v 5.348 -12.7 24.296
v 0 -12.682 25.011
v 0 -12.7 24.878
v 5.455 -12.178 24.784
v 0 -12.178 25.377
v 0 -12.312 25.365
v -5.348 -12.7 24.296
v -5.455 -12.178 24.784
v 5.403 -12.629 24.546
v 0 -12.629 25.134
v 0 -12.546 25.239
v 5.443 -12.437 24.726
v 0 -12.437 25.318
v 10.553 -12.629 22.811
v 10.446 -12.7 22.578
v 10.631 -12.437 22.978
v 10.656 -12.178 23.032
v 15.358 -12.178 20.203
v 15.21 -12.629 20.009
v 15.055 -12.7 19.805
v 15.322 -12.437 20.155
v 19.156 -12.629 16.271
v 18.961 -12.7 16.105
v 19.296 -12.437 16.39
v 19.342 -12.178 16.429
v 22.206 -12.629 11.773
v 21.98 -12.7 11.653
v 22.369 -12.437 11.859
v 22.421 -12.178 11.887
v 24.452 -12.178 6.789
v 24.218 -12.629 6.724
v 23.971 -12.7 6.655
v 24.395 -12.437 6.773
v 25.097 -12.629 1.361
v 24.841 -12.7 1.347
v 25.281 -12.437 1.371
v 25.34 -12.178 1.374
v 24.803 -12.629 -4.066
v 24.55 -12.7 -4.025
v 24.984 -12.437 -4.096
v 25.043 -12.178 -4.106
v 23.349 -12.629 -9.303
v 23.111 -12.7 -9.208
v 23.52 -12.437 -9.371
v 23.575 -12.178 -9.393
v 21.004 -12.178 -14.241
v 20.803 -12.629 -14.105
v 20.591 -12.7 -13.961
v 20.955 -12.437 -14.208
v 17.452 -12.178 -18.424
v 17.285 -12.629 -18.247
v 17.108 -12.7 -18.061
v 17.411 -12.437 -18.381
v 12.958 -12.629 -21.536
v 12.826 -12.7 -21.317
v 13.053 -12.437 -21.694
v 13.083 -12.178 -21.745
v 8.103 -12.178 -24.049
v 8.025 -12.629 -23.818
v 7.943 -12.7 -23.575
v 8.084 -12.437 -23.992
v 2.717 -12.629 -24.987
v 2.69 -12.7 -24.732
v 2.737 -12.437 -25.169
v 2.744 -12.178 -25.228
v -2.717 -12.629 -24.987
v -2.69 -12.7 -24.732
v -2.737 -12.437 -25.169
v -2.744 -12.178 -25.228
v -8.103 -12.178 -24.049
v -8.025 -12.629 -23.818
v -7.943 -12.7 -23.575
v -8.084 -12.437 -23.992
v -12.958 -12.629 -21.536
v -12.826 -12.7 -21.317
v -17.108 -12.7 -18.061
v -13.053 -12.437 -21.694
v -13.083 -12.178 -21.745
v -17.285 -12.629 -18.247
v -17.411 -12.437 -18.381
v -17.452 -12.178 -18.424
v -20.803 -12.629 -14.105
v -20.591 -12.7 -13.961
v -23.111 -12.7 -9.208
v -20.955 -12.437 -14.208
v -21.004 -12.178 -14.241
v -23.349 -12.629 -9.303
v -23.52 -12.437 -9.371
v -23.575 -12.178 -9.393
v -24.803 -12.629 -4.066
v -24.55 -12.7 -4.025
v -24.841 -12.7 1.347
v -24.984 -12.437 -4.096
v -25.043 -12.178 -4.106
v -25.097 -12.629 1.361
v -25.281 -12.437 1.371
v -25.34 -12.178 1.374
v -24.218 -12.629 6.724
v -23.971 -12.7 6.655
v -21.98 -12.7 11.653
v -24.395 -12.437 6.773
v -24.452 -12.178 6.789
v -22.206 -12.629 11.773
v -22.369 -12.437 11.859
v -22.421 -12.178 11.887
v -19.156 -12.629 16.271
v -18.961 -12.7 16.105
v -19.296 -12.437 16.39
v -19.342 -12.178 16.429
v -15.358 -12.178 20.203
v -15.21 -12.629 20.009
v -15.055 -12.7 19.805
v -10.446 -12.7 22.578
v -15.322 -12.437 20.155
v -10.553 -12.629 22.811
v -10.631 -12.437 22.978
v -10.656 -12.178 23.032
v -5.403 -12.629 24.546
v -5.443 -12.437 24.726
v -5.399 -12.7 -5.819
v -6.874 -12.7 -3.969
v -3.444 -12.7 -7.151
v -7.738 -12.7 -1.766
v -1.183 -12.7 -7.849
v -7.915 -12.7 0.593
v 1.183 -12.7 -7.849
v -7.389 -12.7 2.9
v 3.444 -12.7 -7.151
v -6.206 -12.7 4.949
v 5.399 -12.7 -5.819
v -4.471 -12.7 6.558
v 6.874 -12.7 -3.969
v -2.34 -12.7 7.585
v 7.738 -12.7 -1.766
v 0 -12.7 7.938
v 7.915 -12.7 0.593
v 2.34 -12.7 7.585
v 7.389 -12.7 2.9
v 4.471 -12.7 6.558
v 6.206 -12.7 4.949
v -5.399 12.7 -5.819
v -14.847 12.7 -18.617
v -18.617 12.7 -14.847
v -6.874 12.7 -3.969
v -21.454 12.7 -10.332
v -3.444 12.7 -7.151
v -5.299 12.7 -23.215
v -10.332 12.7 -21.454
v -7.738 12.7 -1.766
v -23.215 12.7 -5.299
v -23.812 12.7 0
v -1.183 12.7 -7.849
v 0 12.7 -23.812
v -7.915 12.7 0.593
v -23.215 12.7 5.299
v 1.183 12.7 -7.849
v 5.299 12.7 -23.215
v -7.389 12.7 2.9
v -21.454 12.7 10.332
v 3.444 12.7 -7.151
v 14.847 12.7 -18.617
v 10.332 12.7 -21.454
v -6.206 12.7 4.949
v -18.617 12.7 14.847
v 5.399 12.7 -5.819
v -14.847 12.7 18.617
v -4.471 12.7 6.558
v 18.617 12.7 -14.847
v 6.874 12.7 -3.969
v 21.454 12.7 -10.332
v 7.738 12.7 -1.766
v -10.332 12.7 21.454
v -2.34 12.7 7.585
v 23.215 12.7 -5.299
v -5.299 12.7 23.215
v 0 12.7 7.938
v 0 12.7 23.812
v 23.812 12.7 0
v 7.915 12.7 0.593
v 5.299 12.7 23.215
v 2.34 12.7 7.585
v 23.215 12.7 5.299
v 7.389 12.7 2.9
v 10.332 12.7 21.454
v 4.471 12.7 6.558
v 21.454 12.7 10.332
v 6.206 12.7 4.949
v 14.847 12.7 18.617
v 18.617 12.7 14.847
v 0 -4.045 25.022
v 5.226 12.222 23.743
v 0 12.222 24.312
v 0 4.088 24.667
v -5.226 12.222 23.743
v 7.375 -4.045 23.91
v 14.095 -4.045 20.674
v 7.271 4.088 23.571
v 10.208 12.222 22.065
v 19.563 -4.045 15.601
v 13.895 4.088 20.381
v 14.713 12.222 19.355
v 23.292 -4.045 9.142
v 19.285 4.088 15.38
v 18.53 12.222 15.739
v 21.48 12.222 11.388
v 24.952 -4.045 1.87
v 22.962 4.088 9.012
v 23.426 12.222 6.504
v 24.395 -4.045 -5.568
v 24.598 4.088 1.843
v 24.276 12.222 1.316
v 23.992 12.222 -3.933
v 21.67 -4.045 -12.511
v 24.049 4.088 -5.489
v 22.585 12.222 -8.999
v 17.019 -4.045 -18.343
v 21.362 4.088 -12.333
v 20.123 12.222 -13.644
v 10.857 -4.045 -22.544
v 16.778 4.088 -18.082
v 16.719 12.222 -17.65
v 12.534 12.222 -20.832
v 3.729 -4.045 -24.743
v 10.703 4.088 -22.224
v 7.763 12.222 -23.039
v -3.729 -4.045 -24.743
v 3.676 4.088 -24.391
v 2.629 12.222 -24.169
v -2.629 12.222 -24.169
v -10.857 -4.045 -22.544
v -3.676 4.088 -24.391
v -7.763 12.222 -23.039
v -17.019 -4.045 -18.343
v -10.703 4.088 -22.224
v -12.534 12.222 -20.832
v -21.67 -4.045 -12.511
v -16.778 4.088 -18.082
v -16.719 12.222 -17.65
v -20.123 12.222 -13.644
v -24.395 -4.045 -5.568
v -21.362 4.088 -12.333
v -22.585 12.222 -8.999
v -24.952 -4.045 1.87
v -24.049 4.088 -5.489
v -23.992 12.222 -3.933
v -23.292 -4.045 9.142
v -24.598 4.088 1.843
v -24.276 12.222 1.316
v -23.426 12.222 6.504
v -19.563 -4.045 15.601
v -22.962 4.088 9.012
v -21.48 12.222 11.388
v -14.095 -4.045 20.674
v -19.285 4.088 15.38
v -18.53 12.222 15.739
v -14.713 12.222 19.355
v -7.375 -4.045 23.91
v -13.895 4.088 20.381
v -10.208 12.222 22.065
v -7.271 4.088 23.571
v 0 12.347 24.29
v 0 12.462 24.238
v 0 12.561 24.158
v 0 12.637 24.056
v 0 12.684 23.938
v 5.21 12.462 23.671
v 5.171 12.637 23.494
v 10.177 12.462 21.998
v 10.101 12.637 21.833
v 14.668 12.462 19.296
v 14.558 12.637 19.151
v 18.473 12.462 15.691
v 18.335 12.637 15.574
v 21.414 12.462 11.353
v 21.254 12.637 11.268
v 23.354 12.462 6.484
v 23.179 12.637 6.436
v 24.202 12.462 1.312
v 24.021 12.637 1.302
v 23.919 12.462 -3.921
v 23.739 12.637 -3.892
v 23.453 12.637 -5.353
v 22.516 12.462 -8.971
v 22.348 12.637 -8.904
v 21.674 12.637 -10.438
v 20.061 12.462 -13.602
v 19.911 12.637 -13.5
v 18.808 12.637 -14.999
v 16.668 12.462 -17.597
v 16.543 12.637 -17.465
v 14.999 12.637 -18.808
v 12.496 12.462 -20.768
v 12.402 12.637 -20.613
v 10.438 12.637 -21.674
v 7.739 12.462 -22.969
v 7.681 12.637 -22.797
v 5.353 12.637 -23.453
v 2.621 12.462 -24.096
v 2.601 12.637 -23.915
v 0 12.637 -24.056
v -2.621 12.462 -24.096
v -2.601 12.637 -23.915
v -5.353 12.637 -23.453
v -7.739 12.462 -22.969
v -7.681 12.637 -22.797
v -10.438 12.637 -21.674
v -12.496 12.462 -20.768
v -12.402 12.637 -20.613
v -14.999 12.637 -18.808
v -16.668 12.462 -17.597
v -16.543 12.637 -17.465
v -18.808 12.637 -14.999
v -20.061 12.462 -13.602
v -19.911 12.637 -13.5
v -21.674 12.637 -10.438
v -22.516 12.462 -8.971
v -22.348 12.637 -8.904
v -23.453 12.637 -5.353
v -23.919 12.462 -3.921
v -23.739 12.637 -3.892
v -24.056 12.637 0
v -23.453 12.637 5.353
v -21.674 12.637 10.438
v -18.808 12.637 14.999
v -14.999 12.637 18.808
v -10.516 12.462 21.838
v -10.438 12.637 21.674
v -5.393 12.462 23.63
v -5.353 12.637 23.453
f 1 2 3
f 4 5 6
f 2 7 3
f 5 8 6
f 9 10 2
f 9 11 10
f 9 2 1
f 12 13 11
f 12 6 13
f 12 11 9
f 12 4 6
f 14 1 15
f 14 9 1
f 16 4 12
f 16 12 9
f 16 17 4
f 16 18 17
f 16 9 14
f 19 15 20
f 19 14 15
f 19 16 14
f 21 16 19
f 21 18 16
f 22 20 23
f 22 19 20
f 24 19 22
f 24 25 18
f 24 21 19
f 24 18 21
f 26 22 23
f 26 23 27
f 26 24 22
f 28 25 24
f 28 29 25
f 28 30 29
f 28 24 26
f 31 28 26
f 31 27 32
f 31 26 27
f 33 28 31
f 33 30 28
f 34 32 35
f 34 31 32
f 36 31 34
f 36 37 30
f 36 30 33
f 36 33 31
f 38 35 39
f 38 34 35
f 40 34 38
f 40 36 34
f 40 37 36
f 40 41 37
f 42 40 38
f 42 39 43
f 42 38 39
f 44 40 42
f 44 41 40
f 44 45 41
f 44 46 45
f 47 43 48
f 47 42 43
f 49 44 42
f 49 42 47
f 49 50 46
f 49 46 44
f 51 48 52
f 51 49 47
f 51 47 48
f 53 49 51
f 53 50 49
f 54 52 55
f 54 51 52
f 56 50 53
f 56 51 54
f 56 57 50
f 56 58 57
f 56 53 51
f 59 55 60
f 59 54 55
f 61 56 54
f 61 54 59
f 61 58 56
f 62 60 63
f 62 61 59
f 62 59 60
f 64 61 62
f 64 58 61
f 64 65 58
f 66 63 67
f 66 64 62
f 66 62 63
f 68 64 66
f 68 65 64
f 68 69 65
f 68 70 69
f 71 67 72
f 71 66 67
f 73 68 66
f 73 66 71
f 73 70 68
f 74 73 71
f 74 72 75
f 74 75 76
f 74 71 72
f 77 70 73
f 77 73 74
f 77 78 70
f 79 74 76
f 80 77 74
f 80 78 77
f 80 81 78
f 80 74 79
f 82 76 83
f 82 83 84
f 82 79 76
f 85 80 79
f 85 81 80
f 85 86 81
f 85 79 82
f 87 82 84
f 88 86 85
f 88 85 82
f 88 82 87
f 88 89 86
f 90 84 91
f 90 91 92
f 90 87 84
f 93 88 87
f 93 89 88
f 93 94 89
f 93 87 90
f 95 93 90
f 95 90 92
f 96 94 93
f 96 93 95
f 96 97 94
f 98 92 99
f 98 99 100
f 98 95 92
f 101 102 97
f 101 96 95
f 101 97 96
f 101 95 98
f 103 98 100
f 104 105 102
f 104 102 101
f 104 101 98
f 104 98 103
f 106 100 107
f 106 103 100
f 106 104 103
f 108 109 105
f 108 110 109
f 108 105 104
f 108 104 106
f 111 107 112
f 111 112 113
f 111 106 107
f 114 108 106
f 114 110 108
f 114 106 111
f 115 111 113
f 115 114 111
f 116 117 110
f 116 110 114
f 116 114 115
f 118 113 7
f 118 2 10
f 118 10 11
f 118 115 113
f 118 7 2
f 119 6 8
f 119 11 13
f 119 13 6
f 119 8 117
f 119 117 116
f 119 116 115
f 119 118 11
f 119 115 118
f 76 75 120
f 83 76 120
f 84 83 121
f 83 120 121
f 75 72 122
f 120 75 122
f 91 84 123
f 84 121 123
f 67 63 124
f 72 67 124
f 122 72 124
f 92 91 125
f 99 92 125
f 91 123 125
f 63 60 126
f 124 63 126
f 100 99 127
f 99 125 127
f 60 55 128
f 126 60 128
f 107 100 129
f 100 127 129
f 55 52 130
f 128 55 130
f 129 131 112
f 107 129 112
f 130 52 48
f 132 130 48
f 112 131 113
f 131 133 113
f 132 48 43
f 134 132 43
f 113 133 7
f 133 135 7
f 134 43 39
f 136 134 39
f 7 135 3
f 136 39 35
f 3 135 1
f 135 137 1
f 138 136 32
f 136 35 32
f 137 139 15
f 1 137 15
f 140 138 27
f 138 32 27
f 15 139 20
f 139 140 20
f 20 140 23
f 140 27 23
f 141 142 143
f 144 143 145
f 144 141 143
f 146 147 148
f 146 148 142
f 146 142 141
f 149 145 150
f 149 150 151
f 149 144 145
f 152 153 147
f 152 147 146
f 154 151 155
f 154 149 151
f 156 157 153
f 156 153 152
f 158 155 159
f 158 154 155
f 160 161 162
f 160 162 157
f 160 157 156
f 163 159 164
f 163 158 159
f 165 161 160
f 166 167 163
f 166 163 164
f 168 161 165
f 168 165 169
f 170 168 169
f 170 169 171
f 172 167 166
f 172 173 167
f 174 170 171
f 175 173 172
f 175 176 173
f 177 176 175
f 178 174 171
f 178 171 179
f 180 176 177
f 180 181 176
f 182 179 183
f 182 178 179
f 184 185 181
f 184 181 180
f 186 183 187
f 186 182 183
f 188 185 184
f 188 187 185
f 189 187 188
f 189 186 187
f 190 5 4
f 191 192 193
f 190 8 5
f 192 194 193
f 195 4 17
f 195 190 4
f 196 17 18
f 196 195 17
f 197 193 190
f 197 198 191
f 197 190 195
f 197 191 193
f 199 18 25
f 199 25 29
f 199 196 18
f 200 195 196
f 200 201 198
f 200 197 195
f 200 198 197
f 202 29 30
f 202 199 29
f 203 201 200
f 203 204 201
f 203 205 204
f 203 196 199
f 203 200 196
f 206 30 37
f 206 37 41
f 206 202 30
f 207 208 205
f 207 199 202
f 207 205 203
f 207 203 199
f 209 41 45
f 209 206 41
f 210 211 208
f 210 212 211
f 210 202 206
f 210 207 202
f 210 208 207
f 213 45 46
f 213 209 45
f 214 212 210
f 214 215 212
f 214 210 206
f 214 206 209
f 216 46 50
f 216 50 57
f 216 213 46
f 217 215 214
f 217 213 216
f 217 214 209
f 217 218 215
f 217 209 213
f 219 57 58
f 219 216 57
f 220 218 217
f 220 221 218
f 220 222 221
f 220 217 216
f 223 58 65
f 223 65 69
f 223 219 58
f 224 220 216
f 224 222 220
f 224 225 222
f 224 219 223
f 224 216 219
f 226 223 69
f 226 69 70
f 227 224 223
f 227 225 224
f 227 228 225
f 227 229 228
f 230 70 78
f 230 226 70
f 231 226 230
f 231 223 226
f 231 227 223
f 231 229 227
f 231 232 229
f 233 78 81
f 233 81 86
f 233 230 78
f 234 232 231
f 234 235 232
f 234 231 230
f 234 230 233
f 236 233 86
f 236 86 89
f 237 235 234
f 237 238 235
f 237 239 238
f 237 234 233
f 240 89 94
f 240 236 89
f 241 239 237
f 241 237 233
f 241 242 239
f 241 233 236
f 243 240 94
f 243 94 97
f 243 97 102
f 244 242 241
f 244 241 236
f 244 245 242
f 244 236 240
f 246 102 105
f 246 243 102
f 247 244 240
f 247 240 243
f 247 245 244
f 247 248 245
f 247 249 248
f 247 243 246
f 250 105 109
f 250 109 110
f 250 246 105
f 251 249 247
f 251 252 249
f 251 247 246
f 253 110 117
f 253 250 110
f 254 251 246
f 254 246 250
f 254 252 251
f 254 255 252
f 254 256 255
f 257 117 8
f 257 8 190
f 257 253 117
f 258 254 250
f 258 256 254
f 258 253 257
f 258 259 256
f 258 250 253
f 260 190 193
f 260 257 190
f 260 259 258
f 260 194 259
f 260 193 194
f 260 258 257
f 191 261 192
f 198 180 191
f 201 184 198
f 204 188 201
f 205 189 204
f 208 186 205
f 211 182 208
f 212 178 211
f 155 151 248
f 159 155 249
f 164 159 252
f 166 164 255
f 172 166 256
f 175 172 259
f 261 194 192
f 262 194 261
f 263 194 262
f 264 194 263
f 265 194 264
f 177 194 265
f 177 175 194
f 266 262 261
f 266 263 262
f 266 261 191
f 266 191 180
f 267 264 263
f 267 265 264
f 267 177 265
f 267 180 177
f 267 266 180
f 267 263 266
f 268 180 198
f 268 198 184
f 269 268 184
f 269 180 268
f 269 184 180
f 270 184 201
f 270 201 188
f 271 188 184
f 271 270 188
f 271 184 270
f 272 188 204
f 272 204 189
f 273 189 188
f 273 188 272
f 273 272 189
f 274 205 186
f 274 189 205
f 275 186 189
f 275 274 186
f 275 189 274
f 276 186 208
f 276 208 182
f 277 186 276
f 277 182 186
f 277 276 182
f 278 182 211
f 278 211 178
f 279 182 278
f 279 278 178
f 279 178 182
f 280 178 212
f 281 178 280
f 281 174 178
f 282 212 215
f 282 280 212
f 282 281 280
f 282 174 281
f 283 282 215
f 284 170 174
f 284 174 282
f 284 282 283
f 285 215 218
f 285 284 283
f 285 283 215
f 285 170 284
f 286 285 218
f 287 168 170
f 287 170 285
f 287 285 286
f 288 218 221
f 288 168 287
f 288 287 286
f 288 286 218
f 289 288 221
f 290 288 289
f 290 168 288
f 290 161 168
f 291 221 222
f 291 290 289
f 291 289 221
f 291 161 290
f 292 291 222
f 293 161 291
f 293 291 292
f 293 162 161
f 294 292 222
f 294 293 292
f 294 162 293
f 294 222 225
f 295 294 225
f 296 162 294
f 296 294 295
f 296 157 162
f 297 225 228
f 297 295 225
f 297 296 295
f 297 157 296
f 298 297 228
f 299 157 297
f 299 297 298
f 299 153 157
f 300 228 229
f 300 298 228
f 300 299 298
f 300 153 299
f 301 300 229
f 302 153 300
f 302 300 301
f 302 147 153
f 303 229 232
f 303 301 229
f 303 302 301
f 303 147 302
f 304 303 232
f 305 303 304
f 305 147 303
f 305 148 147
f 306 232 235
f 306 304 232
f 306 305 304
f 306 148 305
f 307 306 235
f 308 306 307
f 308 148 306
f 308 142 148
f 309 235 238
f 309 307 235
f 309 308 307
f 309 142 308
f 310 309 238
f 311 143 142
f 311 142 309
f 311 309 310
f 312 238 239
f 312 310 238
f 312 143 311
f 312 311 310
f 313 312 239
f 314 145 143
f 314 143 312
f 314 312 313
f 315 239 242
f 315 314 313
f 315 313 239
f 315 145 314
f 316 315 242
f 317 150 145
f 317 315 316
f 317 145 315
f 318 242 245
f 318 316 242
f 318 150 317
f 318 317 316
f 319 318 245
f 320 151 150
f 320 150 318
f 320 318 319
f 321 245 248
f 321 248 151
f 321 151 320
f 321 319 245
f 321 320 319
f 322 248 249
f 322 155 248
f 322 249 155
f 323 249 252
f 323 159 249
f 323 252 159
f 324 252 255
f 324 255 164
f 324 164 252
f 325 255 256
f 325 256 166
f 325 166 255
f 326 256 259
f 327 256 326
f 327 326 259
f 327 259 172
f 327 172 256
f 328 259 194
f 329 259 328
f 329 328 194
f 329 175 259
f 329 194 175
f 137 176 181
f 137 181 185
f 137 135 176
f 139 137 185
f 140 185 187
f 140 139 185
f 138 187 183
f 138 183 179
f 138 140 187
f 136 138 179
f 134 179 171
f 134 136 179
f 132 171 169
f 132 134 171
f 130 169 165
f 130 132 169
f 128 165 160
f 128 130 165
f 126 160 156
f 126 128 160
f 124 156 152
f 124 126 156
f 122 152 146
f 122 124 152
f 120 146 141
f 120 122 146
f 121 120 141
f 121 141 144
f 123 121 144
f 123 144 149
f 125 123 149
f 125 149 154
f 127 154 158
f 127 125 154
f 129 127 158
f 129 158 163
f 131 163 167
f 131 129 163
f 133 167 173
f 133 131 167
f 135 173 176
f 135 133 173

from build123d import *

# Parameters (mm, degrees)
SKETCH1_R           = 25.4
SKETCH1_R_2         = 7.9375
BOSS_EXTRUDE1_DEPTH = 12.7
CHAMFER1_SIZE       = 25.4
CHAMFER1_SIZE_2     = 1.10898795
FILLET1_R           = 0.5


with BuildPart() as part:
    # Sketch1 → Boss-Extrude1 (new, symmetric)
    with BuildSketch(Plane(origin=(0, 0, 0), x_dir=(1, 0, 0), z_dir=(0, 1, 0))):
        with Locations(Location((0, 0, 0), (0, 0, 270))):
            Circle(SKETCH1_R)
        with Locations(Location((0, 0, 0), (0, 0, 270))):
            Circle(SKETCH1_R_2, mode=Mode.SUBTRACT)
    extrude(amount=BOSS_EXTRUDE1_DEPTH, both=True)

    # Chamfer1
    # the kernel refuses this chamfer: 25.4, 1.10898795 mm, written as the material it takes off along each edge
    with BuildSketch(Plane(origin=(0, 12.7, 0), x_dir=(0, 0, 1), z_dir=(-1, 0, 0))) as chamfer1_piece_1:
        Polygon((25.4, -CHAMFER1_SIZE), (25.4 - CHAMFER1_SIZE_2, 0), (25.4, 0), align=None)
    revolve(axis=Axis((0, 12.7, 0), (0, 1, 0)), mode=Mode.SUBTRACT)

    # Fillet1
    fillet1_edges = [part.edges().sort_by_distance(p)[0] for p in [
        (0, -12.7, -25.4),
        (0, 12.7, -24.29101205),
    ]]
    fillet(fillet1_edges, radius=FILLET1_R)


solid = part.part
